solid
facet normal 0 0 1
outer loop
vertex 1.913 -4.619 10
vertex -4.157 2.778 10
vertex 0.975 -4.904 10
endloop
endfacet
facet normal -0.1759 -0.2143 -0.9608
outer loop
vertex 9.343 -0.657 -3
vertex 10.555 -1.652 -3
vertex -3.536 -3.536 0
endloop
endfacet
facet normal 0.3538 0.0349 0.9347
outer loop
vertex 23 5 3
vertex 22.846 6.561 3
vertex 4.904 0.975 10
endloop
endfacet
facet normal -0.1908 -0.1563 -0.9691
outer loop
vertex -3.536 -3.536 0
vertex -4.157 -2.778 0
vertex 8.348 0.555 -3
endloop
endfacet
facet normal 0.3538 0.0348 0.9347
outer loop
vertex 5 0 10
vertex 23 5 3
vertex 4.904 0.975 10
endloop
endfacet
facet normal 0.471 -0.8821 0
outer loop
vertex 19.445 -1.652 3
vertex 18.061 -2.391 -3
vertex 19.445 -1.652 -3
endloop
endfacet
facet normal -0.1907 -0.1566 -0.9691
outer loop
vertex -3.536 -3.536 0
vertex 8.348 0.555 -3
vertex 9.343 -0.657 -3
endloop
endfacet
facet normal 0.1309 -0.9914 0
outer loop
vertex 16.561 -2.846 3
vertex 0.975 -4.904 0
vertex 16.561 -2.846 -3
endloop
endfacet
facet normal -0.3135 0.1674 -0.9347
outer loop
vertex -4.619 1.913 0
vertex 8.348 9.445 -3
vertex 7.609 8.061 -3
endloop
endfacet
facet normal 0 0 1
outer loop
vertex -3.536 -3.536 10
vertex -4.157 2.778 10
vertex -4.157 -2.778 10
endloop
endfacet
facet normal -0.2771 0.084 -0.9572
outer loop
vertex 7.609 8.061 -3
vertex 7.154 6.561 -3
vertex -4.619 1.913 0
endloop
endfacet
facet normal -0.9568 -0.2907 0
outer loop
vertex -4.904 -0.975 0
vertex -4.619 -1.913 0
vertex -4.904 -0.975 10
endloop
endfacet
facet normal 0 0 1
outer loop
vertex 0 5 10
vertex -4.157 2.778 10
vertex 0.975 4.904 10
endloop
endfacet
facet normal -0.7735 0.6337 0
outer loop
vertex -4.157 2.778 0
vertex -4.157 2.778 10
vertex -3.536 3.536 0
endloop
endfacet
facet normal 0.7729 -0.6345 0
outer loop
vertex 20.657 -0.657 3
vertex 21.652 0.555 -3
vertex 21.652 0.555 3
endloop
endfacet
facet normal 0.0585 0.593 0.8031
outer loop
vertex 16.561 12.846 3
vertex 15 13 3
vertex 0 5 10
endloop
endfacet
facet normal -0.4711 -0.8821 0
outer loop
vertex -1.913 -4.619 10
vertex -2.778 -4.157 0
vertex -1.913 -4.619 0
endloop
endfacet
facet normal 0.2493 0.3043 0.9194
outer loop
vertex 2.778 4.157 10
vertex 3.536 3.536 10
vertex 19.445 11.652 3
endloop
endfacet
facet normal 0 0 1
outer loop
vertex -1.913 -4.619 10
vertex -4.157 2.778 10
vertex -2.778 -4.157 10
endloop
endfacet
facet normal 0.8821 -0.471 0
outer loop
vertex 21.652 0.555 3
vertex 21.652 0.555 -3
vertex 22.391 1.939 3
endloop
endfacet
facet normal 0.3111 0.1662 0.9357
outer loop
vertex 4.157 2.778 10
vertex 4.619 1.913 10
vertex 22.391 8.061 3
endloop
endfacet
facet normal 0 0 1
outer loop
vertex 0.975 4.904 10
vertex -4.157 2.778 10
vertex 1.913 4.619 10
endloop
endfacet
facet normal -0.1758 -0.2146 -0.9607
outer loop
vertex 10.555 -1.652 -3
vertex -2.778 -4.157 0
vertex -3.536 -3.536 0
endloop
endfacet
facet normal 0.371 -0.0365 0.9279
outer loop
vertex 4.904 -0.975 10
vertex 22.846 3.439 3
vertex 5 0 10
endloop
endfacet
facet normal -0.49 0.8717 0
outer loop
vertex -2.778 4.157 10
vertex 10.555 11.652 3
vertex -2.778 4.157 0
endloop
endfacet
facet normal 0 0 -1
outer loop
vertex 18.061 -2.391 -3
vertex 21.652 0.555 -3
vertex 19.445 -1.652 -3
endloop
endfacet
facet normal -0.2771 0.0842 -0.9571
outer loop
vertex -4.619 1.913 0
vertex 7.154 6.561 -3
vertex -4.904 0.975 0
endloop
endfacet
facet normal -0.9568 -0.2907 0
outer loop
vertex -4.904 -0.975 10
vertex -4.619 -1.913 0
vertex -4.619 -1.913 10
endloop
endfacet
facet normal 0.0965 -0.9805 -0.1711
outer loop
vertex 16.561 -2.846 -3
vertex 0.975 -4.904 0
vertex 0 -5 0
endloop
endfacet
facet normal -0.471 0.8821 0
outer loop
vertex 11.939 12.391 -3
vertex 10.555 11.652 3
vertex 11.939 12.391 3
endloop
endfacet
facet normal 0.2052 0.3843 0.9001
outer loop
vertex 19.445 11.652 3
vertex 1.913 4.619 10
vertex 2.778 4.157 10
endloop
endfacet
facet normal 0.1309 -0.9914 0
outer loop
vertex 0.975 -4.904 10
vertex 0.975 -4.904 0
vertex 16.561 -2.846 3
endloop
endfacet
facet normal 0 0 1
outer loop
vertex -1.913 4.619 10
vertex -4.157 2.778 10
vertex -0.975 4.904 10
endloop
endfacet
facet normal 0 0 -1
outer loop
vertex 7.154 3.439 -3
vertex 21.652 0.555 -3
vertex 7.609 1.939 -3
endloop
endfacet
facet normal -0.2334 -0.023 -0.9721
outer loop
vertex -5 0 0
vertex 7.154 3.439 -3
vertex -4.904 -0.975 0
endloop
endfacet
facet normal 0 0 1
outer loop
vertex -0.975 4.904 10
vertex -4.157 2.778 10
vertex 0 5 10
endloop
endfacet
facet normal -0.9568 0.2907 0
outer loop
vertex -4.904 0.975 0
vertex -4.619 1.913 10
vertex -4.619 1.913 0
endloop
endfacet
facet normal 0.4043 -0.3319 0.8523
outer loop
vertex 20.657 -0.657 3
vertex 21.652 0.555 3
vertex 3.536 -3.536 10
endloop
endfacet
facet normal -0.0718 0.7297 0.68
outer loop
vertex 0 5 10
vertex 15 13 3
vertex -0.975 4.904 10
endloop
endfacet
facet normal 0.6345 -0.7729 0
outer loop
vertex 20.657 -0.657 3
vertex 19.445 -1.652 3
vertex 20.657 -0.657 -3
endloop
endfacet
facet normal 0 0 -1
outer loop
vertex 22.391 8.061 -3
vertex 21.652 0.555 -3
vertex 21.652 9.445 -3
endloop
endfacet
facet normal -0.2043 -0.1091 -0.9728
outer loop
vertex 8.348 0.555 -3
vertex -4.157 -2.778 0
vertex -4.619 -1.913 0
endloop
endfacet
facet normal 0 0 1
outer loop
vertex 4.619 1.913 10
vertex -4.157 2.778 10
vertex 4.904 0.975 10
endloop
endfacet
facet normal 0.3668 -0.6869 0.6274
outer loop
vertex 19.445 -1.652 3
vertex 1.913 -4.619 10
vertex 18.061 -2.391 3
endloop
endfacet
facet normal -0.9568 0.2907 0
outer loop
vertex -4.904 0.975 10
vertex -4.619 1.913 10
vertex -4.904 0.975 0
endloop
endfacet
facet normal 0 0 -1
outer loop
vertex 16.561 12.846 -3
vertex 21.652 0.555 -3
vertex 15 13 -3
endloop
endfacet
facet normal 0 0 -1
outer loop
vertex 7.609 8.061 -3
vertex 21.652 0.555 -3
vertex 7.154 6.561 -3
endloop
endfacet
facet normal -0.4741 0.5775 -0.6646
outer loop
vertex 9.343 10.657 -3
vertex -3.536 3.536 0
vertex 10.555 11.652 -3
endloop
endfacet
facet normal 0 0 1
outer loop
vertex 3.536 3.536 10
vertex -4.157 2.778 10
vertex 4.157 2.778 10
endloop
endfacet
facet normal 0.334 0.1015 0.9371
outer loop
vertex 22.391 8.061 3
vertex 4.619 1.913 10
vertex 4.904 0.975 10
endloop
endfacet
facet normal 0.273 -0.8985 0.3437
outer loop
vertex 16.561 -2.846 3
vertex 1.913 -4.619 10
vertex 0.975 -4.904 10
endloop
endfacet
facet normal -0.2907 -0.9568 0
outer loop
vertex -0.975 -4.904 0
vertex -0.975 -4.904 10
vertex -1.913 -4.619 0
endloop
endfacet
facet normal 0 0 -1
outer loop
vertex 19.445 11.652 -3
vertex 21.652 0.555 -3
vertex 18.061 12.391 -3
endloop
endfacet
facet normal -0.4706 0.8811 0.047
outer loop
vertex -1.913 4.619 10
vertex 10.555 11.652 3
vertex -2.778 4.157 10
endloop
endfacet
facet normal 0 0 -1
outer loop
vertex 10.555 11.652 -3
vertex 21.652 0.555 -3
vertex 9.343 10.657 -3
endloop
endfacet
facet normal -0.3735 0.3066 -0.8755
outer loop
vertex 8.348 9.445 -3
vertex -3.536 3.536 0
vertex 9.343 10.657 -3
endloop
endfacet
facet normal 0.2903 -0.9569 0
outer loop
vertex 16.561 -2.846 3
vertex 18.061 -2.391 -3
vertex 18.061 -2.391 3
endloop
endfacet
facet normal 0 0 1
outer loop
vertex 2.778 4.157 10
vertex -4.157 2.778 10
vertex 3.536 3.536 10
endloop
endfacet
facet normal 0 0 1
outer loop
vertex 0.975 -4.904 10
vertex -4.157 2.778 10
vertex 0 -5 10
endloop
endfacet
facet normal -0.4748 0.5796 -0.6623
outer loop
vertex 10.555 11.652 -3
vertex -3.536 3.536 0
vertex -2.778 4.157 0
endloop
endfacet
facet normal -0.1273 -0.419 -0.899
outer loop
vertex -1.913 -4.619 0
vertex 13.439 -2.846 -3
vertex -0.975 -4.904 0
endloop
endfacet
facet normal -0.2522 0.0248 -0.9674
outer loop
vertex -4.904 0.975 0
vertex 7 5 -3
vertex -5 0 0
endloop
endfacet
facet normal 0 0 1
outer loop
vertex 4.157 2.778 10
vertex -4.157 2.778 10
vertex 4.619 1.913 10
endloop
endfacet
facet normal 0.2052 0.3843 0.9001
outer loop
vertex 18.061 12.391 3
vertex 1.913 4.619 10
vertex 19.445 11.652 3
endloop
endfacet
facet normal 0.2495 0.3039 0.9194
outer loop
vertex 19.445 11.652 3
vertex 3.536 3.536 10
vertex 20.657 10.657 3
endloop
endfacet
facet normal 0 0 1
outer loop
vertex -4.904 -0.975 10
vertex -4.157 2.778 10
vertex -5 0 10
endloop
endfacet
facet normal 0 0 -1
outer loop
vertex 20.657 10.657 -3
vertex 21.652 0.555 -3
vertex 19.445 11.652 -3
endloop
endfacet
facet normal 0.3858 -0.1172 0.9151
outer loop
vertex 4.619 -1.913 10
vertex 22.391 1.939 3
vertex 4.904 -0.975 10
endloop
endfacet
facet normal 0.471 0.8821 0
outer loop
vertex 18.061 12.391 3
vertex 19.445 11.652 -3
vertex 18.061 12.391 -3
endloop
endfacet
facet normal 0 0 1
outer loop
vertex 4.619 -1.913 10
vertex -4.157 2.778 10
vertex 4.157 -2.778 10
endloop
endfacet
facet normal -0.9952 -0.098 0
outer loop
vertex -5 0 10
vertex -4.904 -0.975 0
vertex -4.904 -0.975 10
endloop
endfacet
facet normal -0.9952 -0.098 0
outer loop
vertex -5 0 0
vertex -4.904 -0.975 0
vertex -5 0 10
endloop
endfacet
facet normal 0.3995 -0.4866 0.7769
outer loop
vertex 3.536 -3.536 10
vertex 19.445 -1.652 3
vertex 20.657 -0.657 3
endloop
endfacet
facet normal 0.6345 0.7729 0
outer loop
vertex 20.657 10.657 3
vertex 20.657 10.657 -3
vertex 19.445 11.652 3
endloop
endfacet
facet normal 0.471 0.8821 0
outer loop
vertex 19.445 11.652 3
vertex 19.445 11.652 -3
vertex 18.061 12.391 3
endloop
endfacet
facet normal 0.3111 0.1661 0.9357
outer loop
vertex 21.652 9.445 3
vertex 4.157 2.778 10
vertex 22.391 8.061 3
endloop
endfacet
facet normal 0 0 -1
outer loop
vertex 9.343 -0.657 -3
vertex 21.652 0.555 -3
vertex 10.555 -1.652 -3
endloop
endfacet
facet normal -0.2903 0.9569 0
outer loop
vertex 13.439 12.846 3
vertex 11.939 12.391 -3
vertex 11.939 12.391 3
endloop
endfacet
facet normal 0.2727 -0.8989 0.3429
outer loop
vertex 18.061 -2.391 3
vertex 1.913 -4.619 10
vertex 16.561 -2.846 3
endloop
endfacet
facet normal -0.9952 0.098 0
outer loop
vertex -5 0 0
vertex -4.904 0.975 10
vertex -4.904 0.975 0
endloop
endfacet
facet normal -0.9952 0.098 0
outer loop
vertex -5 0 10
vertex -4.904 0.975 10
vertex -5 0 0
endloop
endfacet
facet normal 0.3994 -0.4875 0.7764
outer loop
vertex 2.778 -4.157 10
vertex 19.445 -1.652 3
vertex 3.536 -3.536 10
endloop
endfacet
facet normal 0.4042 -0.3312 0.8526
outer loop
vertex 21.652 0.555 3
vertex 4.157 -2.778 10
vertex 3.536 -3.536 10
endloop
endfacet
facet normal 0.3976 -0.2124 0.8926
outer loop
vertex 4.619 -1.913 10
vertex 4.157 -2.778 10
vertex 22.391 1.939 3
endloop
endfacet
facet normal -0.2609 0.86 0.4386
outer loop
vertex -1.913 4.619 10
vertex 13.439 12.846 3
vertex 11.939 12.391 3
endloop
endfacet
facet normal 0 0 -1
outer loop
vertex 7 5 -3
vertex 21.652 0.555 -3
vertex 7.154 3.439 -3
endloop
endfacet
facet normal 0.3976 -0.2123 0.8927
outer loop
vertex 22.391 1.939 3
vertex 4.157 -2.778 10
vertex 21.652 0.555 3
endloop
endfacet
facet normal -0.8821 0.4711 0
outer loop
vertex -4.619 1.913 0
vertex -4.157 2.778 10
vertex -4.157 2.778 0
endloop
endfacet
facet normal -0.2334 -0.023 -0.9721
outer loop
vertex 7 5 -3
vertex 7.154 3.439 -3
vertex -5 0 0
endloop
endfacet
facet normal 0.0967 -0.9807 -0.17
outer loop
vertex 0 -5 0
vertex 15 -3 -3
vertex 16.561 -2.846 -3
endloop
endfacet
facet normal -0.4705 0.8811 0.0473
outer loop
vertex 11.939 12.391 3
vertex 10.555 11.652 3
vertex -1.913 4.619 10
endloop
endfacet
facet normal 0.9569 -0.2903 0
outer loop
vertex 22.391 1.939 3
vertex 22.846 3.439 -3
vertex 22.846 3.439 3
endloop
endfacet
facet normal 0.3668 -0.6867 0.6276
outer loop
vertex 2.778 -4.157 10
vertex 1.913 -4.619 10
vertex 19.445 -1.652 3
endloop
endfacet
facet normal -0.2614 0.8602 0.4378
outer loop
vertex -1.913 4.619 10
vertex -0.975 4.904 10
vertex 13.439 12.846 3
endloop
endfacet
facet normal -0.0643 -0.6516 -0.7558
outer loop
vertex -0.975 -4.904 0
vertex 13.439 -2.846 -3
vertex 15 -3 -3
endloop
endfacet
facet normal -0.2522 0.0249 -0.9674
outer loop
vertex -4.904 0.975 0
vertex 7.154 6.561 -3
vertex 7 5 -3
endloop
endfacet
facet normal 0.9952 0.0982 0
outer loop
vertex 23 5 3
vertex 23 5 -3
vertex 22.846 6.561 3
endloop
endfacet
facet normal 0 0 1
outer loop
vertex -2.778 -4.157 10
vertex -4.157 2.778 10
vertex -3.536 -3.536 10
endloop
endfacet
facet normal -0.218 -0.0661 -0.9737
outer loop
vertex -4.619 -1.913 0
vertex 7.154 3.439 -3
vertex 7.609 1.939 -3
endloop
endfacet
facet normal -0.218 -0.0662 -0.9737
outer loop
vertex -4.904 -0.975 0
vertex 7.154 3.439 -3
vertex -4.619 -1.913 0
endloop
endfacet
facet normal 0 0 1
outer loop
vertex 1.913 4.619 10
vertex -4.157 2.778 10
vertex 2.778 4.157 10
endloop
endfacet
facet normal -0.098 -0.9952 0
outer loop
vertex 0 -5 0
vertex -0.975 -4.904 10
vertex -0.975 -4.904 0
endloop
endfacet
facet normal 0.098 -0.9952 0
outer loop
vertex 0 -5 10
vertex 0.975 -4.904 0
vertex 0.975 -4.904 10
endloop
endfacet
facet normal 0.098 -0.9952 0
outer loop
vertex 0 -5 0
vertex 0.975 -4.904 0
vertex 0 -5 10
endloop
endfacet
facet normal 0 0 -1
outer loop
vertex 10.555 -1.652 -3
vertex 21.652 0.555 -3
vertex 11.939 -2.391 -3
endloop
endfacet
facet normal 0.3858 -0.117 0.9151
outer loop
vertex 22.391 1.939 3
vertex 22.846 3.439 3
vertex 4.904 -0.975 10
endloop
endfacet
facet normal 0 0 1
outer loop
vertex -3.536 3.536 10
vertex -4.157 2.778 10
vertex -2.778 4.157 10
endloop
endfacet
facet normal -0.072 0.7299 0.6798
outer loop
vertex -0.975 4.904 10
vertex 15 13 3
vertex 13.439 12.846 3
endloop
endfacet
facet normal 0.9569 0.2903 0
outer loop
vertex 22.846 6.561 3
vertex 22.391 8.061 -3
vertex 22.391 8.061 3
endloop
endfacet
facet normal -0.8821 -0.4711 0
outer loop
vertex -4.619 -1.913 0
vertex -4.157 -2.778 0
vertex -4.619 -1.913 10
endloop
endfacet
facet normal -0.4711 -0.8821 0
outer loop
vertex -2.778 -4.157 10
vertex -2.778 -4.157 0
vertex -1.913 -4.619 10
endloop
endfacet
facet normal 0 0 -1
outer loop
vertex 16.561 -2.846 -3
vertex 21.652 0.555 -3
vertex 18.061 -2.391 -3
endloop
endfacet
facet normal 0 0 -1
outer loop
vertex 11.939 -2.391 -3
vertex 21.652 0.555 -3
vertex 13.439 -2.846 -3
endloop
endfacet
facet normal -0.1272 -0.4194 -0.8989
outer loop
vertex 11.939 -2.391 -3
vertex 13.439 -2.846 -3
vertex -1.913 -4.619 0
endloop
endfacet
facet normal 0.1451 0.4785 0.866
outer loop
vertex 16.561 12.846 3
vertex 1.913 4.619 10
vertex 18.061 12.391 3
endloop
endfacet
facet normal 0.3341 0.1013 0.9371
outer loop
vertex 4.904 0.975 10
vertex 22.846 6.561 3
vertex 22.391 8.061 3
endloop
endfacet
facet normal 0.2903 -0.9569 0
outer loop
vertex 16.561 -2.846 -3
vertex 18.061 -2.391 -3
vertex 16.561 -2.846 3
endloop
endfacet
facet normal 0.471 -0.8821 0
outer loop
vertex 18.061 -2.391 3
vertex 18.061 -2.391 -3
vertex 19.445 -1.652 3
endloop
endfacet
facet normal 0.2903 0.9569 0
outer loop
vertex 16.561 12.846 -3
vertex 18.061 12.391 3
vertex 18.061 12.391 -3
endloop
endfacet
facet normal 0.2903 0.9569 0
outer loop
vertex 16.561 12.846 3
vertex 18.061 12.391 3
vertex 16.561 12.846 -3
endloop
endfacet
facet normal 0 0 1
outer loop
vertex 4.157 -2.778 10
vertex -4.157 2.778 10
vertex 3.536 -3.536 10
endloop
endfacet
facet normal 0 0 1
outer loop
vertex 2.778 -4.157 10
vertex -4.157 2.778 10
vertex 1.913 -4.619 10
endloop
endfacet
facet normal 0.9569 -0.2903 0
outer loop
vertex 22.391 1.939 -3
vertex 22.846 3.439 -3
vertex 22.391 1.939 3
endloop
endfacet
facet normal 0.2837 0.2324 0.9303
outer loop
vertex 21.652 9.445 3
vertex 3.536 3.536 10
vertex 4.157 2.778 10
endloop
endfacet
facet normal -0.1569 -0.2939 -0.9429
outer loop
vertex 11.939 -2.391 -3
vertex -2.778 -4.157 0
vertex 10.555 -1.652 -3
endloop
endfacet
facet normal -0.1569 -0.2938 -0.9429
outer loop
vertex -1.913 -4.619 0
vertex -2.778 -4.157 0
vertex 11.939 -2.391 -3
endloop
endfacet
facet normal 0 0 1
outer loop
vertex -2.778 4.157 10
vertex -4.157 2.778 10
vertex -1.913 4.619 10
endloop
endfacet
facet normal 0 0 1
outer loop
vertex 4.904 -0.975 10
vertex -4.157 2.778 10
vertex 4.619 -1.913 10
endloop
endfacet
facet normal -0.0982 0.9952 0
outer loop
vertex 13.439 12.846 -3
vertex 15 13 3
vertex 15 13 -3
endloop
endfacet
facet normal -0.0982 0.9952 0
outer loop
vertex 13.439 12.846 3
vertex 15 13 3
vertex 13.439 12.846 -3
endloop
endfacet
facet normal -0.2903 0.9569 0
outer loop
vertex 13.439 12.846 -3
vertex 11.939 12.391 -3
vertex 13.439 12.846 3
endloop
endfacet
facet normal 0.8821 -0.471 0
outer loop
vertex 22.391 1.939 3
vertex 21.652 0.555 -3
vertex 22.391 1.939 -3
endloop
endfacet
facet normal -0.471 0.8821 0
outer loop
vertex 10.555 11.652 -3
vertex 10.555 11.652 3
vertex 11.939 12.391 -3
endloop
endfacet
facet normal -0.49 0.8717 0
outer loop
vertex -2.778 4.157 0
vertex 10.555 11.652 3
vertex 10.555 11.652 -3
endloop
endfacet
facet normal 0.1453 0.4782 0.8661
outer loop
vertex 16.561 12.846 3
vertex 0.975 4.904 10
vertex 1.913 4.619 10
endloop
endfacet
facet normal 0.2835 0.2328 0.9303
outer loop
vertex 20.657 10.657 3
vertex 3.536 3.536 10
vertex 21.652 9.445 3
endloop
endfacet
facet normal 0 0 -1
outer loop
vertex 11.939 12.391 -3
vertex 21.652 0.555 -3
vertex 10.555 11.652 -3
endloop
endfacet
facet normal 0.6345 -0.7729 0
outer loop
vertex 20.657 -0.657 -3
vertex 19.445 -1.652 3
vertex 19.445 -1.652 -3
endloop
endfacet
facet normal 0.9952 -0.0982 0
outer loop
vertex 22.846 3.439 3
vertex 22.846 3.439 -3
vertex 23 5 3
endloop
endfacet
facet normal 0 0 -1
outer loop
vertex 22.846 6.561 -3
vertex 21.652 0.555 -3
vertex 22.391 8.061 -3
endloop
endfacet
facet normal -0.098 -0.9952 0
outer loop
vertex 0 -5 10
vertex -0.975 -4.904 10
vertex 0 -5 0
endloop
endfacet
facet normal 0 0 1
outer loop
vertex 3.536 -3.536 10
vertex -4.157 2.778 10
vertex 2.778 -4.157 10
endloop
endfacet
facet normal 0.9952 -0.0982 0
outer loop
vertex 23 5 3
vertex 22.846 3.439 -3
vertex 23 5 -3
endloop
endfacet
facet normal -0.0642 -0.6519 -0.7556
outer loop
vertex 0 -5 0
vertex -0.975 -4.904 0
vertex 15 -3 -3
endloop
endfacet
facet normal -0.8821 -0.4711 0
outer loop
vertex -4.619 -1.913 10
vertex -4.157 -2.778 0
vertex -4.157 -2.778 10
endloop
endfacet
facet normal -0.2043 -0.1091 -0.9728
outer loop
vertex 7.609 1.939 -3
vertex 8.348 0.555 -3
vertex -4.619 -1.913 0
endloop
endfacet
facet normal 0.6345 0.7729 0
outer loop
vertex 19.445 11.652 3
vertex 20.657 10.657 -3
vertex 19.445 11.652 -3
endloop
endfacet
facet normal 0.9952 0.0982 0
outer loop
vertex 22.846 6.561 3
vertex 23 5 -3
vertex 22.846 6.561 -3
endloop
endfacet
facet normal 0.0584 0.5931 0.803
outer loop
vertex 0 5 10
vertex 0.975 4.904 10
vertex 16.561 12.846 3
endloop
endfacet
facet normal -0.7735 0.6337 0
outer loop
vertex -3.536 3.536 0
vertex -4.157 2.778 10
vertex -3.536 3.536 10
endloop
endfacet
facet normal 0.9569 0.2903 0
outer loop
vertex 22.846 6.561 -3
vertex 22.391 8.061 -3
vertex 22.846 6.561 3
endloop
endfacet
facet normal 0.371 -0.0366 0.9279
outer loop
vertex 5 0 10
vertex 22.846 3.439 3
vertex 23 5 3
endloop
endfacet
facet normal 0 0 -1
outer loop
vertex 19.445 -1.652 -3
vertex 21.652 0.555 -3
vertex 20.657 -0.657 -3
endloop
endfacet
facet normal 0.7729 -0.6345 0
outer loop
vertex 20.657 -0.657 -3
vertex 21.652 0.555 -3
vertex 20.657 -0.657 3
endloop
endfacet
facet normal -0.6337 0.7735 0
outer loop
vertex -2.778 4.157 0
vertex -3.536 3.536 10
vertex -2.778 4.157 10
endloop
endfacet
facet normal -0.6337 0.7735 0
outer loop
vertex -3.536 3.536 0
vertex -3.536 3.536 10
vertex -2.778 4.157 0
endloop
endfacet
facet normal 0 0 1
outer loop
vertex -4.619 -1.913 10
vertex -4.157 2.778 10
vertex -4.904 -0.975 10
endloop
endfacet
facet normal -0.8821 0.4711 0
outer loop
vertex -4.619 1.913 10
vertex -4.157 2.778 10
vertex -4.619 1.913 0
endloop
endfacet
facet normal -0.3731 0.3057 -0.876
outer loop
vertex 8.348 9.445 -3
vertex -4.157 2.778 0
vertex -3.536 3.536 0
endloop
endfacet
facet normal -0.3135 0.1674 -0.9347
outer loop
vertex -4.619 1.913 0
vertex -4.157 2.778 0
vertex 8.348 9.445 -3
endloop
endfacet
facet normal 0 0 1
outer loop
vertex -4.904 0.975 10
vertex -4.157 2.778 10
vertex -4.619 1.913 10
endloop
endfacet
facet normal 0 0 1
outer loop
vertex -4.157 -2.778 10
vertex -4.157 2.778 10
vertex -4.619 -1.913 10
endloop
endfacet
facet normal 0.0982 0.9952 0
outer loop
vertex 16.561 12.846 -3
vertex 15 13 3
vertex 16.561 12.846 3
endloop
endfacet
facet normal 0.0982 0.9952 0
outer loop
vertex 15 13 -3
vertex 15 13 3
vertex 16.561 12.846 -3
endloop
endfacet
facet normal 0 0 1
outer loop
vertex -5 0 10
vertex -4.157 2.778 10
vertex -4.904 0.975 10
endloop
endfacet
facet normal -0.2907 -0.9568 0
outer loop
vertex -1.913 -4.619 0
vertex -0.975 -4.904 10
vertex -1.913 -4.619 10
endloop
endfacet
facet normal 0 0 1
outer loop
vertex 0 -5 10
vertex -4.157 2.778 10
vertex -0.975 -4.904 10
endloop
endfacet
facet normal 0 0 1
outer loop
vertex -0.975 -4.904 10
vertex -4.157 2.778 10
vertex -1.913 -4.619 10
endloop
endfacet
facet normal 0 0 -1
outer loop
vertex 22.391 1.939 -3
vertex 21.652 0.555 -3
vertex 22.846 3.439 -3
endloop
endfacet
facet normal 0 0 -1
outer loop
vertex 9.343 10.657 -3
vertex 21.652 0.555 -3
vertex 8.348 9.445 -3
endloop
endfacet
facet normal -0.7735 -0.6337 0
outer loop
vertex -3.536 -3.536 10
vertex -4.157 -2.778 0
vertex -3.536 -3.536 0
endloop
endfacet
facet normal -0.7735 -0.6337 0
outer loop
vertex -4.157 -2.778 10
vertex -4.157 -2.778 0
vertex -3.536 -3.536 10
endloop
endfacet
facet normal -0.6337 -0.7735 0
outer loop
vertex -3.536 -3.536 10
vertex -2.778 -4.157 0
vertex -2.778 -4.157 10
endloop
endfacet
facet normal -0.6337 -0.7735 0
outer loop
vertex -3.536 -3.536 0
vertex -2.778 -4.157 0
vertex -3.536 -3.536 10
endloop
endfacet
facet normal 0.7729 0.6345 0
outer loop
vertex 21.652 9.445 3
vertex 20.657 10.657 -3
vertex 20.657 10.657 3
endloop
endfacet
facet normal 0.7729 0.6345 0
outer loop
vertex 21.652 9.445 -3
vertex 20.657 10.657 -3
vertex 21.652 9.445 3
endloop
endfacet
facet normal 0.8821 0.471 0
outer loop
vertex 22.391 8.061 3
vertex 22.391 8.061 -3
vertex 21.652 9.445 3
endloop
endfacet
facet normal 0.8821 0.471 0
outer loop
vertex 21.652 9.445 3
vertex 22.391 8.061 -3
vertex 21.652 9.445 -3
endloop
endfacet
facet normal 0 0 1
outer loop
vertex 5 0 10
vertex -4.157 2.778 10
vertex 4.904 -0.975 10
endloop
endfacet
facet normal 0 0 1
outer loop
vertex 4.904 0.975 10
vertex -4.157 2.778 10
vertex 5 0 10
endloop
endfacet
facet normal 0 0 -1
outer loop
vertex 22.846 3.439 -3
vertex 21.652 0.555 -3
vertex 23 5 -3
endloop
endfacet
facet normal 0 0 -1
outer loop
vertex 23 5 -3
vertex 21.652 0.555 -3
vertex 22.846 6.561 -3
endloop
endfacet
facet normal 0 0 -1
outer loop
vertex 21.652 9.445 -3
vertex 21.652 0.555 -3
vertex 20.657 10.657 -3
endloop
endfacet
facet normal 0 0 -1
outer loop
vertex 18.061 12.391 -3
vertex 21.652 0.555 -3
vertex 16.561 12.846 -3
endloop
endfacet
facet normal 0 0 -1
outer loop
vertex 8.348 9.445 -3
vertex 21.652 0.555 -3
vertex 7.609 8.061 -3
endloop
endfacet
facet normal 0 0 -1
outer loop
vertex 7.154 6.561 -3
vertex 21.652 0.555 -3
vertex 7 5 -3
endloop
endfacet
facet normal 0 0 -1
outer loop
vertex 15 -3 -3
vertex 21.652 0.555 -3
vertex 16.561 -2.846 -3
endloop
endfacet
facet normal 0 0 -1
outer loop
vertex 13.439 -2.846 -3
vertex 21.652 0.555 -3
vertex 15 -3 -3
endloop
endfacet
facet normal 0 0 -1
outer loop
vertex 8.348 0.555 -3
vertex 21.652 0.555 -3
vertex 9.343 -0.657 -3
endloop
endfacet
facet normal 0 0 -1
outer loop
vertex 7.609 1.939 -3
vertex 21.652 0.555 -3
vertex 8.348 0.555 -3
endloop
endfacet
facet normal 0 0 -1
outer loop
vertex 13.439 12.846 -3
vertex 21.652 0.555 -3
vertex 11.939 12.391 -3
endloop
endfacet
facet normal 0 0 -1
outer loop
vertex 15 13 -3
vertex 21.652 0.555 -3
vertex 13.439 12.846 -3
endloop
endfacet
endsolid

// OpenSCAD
// =============================================================================
// test_hull_two_cylinders.scad
//
// Two cylinders at different positions and radii.
// Pattern from: gears.scad (thumbwheel_lobe)
// Expected: a truncated cone / frustum bridging both cylinder ends.
// =============================================================================

$fn = 32;

hull() {
    cylinder(r = 5, h = 10);
    translate([15, 5, -3]) {
        cylinder(r = 8, h = 6);
    }
}
